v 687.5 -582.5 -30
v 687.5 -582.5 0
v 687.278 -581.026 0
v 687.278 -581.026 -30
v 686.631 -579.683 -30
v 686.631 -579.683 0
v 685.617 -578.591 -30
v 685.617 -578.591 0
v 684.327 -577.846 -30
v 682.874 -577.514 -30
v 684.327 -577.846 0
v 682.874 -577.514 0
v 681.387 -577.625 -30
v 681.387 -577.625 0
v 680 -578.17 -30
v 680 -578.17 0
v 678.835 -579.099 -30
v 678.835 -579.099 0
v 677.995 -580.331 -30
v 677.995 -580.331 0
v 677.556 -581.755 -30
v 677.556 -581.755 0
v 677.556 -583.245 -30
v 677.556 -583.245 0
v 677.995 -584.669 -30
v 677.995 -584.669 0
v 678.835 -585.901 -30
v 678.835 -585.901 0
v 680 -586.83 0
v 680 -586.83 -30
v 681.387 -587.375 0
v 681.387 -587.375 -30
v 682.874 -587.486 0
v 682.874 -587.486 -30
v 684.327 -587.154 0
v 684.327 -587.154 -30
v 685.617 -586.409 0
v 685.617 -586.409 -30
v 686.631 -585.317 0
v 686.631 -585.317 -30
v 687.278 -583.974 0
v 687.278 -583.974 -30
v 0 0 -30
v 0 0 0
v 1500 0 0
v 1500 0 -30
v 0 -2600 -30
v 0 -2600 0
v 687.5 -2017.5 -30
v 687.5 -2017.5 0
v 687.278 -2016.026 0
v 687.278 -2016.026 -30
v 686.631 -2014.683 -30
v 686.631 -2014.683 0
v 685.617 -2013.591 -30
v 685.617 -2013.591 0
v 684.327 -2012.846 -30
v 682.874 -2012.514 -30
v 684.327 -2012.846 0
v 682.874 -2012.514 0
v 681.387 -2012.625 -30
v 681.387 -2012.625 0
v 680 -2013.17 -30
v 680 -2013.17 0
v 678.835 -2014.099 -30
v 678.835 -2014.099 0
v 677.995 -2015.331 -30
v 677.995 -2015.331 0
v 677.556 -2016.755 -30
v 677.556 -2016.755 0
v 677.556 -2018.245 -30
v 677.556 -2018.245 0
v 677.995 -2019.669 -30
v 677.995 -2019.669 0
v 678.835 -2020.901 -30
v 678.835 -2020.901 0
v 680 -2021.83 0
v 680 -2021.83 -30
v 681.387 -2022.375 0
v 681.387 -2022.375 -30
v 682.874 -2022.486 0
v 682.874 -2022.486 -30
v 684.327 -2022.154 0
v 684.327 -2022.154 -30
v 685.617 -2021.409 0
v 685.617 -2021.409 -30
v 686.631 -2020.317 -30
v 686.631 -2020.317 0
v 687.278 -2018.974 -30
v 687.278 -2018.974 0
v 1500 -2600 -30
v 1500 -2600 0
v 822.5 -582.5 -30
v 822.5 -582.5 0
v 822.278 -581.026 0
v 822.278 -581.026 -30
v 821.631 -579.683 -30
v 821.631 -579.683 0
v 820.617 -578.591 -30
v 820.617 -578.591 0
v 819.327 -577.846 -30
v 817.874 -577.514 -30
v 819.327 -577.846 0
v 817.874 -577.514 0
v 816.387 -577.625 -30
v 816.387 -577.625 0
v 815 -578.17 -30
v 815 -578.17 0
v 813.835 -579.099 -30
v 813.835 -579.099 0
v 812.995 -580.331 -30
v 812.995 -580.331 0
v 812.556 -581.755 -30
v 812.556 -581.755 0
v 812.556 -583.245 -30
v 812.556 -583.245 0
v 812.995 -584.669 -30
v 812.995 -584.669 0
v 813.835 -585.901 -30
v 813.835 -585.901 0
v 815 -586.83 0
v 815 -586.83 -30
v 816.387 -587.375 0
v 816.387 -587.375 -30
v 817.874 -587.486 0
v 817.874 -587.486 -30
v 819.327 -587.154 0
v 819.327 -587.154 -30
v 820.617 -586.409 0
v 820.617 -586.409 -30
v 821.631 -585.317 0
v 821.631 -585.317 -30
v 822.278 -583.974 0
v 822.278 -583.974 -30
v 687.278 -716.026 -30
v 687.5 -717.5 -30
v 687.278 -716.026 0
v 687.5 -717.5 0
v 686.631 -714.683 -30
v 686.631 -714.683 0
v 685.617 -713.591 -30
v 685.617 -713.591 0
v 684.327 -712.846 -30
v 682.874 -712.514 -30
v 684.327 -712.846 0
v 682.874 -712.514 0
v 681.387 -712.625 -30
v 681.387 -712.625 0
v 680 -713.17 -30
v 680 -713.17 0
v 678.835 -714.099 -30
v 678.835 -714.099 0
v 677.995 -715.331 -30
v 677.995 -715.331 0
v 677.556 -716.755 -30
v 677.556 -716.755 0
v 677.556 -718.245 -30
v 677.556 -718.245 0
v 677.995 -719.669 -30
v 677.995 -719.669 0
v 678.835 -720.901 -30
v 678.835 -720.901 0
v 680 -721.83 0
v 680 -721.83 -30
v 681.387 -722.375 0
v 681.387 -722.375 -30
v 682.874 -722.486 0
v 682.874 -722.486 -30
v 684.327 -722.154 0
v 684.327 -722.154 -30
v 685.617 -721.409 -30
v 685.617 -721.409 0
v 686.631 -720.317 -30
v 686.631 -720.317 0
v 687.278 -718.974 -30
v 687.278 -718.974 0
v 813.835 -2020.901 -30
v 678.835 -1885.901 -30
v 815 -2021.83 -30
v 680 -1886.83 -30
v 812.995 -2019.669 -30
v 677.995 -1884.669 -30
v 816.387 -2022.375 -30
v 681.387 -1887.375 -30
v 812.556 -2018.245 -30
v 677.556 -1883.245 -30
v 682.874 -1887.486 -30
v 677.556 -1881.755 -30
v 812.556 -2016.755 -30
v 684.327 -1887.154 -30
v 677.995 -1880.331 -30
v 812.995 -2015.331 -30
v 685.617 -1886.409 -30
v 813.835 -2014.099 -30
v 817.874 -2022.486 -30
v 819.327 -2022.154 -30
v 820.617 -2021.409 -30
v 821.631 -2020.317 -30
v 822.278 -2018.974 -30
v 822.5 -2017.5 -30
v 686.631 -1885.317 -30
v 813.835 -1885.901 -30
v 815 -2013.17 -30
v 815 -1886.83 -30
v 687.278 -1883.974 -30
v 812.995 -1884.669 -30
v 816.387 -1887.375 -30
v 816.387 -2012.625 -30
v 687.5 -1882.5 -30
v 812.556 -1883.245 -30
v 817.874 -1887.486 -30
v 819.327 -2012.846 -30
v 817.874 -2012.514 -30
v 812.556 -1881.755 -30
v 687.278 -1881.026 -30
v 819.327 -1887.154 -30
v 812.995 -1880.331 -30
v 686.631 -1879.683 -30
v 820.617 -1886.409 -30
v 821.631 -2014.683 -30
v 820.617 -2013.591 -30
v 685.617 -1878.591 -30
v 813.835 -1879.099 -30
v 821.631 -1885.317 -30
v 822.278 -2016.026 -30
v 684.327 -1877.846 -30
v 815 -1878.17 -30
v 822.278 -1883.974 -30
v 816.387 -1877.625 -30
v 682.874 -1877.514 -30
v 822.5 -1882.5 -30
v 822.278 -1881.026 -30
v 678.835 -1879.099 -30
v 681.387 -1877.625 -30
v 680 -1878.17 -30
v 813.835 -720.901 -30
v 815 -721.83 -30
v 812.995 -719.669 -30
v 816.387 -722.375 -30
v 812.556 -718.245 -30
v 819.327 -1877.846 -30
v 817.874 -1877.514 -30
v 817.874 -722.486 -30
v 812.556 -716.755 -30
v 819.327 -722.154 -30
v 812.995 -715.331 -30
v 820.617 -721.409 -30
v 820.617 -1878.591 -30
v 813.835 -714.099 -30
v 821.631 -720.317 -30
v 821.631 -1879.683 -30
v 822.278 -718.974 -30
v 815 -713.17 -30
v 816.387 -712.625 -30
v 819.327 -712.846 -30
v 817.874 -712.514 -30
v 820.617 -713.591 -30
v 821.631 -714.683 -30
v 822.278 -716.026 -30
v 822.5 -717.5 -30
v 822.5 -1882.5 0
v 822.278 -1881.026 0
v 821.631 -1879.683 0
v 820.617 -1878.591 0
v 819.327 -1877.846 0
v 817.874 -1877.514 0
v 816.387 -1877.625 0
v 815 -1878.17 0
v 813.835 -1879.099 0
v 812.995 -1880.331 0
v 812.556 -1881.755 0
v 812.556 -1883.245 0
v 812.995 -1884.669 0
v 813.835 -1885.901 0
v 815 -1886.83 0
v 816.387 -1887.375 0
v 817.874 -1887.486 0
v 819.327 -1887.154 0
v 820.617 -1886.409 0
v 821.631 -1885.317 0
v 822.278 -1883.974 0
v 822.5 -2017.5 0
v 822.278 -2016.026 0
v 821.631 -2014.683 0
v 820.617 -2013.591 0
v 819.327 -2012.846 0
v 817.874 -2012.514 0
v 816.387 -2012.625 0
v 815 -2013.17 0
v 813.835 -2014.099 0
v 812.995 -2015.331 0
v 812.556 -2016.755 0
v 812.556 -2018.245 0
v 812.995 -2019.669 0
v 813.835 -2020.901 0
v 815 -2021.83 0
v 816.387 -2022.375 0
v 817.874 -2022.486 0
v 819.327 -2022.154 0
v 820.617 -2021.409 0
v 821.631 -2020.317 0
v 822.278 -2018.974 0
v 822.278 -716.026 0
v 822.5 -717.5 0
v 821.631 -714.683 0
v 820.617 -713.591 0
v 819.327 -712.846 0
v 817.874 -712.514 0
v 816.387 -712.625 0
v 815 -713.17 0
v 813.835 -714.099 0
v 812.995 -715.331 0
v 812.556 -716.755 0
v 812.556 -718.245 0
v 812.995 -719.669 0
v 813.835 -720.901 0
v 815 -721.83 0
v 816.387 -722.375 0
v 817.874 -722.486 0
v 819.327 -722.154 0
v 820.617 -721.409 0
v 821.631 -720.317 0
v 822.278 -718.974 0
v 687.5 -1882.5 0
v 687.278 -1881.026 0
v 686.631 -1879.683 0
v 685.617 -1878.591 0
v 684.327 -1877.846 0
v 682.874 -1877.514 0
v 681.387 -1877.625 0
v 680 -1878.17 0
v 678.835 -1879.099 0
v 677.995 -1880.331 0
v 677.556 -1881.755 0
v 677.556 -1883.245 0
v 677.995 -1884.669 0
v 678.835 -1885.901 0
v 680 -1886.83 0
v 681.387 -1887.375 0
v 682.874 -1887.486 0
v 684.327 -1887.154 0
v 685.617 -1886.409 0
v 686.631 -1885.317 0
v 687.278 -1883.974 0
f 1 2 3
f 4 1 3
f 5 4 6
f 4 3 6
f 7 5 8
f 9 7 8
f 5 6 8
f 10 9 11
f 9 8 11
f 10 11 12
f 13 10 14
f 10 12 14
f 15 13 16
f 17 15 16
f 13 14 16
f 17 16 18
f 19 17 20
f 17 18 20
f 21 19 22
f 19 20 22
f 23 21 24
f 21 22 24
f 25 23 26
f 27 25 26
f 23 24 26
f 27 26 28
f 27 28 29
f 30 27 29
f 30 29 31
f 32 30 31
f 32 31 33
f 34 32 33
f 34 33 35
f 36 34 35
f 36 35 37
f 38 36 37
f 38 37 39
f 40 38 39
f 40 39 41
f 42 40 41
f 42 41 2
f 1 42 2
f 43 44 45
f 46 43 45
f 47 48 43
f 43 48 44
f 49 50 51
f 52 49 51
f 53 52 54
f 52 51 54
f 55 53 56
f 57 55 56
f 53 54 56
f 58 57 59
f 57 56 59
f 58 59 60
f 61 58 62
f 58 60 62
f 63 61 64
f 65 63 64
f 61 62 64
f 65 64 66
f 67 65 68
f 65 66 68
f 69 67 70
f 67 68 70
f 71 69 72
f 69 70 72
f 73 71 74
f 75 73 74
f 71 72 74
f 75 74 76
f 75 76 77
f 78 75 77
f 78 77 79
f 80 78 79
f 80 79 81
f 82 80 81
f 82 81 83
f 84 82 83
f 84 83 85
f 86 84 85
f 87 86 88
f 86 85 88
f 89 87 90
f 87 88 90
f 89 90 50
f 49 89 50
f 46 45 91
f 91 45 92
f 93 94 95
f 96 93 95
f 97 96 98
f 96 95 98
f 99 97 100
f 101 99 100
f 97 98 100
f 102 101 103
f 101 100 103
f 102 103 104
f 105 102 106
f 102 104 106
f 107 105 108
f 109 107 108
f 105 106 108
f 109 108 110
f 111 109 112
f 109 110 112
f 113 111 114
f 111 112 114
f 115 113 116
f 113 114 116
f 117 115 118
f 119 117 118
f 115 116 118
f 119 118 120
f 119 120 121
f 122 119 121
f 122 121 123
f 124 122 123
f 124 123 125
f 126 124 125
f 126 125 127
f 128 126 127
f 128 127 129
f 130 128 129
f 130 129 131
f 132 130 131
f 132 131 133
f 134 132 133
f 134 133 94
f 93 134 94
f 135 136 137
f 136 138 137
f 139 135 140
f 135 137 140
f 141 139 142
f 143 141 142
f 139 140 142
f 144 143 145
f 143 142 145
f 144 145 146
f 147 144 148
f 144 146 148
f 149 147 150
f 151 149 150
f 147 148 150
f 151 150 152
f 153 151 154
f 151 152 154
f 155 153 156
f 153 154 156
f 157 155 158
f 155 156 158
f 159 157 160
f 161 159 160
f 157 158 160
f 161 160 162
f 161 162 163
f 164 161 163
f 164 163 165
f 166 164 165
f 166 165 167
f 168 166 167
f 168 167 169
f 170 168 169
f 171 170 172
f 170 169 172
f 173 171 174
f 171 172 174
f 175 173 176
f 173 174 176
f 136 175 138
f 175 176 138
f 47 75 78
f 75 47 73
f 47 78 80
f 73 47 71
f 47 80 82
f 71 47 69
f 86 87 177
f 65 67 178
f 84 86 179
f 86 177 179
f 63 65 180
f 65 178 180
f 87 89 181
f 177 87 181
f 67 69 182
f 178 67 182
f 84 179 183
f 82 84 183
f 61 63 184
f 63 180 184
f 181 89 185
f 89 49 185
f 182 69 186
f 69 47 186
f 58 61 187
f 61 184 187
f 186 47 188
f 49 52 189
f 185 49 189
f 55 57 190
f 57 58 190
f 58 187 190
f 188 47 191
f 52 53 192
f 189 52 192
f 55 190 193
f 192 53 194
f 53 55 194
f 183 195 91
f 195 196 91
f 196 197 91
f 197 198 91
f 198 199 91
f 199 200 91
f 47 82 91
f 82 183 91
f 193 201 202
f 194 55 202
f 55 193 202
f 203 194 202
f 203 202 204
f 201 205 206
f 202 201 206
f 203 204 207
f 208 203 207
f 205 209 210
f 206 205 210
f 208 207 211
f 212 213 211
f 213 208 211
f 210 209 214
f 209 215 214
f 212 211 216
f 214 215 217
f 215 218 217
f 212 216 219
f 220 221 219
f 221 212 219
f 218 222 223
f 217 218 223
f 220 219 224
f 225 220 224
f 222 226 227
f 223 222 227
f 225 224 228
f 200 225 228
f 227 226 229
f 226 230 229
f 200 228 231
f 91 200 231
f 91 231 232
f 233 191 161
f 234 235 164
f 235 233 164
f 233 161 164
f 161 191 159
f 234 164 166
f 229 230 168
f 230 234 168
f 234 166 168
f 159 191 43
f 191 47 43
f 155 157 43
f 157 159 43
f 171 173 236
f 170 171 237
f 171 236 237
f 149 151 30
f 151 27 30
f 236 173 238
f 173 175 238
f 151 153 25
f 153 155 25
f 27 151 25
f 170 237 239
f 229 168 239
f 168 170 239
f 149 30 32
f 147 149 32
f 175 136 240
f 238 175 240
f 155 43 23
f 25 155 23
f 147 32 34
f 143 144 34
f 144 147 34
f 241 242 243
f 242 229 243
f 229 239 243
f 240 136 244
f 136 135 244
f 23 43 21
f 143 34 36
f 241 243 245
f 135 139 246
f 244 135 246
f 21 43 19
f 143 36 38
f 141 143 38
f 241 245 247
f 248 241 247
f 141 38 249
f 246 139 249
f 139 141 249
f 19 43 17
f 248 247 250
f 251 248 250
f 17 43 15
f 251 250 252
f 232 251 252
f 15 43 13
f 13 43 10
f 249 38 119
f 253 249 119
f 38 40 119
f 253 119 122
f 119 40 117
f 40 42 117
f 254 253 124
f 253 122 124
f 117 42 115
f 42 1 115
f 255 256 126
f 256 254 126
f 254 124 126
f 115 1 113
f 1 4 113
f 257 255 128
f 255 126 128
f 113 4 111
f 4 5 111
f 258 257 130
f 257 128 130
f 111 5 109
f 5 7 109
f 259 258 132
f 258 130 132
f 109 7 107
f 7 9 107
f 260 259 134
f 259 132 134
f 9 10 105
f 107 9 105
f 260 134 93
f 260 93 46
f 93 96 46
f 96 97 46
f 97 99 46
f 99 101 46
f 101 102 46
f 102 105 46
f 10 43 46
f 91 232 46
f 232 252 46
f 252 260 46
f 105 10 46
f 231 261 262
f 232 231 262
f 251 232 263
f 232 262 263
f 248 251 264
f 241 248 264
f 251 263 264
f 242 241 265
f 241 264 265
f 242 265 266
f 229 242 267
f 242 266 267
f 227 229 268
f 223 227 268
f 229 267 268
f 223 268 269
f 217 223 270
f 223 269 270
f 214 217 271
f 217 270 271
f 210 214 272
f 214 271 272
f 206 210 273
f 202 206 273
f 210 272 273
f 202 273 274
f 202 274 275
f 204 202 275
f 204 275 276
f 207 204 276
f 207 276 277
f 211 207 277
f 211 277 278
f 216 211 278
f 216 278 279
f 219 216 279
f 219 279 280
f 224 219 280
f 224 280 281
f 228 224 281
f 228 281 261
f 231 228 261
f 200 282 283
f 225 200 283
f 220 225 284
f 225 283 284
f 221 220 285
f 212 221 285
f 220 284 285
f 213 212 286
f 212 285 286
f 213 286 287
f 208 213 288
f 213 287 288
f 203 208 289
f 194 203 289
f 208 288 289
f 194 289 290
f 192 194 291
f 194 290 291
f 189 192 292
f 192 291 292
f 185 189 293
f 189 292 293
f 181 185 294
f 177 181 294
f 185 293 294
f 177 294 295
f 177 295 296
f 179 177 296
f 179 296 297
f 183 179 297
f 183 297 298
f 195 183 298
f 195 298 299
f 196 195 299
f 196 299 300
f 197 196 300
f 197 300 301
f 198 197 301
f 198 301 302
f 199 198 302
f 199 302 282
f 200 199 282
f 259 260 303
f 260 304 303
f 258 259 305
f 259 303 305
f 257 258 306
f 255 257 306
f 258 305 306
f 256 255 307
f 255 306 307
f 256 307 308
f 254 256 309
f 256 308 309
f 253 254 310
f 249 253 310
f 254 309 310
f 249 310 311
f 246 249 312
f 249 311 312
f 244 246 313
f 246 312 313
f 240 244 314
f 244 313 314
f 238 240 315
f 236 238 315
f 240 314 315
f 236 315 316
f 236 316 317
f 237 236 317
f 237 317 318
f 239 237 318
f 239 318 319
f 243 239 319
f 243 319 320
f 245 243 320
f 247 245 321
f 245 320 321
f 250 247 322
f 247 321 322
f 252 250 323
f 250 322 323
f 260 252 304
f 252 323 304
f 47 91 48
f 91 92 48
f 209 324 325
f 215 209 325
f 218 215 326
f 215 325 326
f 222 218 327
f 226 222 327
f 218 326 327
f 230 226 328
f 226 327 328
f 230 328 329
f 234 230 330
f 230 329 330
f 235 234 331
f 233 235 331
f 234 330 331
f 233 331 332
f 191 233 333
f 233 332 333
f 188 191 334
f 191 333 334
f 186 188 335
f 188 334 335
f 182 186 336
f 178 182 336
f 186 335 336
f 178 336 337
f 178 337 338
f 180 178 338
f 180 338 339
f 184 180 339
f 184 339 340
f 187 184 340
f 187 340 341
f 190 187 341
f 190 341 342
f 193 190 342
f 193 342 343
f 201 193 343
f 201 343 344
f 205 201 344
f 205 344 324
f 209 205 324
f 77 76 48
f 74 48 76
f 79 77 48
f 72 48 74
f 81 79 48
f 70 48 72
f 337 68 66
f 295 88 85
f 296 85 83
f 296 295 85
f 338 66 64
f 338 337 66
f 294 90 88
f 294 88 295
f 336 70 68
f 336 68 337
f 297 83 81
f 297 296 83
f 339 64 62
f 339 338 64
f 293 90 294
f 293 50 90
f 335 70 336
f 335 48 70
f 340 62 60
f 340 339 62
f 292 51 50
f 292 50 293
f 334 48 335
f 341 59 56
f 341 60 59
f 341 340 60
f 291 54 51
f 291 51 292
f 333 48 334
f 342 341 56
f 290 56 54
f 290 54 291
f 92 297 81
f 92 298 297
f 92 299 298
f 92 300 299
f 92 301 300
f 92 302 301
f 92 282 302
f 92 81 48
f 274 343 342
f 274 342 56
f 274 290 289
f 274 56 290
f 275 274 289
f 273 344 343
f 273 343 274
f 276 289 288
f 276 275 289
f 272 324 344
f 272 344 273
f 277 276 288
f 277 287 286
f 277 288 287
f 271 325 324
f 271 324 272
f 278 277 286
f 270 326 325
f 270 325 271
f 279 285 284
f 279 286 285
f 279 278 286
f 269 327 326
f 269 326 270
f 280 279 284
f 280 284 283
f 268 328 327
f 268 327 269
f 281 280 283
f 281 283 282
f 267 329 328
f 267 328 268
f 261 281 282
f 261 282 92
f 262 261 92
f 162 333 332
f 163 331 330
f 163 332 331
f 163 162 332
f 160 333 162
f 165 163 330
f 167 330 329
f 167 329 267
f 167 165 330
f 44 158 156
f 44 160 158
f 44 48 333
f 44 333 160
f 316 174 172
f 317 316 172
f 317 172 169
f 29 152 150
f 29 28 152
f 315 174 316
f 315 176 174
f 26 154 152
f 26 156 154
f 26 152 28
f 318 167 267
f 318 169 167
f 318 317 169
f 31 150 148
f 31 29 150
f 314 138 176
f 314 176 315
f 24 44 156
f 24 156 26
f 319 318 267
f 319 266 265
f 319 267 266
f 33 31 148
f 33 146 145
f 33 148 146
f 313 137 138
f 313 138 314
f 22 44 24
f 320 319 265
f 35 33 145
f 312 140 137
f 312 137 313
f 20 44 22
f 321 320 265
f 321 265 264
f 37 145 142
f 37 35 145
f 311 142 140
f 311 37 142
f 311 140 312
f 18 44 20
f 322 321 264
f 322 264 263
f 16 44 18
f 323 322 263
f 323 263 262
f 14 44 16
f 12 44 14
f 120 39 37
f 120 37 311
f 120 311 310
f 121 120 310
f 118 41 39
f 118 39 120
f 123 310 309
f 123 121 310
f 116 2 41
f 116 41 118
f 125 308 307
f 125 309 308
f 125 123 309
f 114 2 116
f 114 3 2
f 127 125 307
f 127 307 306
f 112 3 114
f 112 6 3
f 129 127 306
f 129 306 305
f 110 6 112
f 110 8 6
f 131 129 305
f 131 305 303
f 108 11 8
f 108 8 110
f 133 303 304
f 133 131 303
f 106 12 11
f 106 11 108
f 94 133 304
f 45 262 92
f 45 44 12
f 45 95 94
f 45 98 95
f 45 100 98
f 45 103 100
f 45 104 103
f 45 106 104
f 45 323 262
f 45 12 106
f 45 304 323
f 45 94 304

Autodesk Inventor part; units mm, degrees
ref_plane "YZ Plane" through (0, 0, 0) normal (1, 0, 0) x (0, 1, 0)
ref_plane "XZ Plane" through (0, 0, 0) normal (0, 1, 0) x (-1, 0, 0)
ref_plane "XY Plane" through (0, 0, 0) normal (0, 0, 1) x (1, 0, 0)
sketch "Sketch1" plane through (0, 0, 0) normal (0, 0, 1) x (1, 0, 0)
  line L0 (0, 0) -> (1500, 0)
  line L1 (1500, 0) -> (1500, -2600)
  line L2 (1500, -2600) -> (0, -2600)
  line L3 (0, -2600) -> (0, 0)
  line L4 (682.5, -1882.5) -> (817.5, -1882.5) construction
  line L5 (817.5, -1882.5) -> (817.5, -2017.5) construction
  line L6 (817.5, -2017.5) -> (682.5, -2017.5) construction
  line L7 (682.5, -2017.5) -> (682.5, -1882.5) construction
  circle A0 centre (682.5, -1882.5) radius 5
  circle A1 centre (817.5, -1882.5) radius 5
  circle A2 centre (817.5, -2017.5) radius 5
  circle A3 centre (682.5, -2017.5) radius 5
  line L8 (682.5, -1882.5) -> (817.5, -2017.5) construction
  line L9 (817.5, -1882.5) -> (682.5, -2017.5) construction
  circle A4 centre (750, -1950) radius 505 construction
  circle A5 centre (750, -650) radius 505 construction
  line L10 (0, -1300) -> (1500, -1300) construction
  line L11 (682.5, -717.5) -> (817.5, -717.5) construction
  line L12 (817.5, -717.5) -> (817.5, -582.5) construction
  line L13 (817.5, -582.5) -> (682.5, -582.5) construction
  line L14 (682.5, -582.5) -> (682.5, -717.5) construction
  circle A6 centre (682.5, -717.5) radius 5
  circle A7 centre (817.5, -717.5) radius 5
  circle A8 centre (817.5, -582.5) radius 5
  circle A9 centre (682.5, -582.5) radius 5
  line L15 (682.5, -717.5) -> (817.5, -582.5) construction
  line L16 (817.5, -717.5) -> (682.5, -582.5) construction
  dimension "d0" = 1500
  dimension "d1" = 2600
  dimension "d4" = 135
  dimension "d5" = 135
  dimension "d6" = 10
  dimension "d7" = 10
  dimension "d8" = 10
  dimension "d9" = 10
  dimension "d10" = 1010
  dimension "d13" = 45
  dimension "d14" = 650
  dimension "d15" = 1010
  dimension "d16" = 650
  dimension "d17" = 750
  dimension "d18" = 750
extrude "Extrusion1" add sketch "Sketch1" against normal blind 30
sketch "Sketch2" plane through (0, 0, 0) normal (0, 0, 1) x (1, 0, 0)
  circle A0 centre (750, -1950) radius 505 construction
  circle A1 centre (750, -650) radius 505 construction
  point P0 (0, 0)
equation "\"d0\" = comprimento"
equation "\"d1\" = largura"
equation "\"d7\" = d6"
equation "\"d8\" = d6"
equation "\"d9\" = d6"
equation "\"d14\" = distDenso"
equation "\"d15\" = d10"
equation "\"d16\" = d14"
equation "\"d17\" = d18"
equation "\"d18\" = 0.5 * d0"
equation "\"largura\" = 2600"
equation "\"comprimento\" = 1500"
equation "\"distDenso\" = 650"
properties part number "madeiraMesa"
